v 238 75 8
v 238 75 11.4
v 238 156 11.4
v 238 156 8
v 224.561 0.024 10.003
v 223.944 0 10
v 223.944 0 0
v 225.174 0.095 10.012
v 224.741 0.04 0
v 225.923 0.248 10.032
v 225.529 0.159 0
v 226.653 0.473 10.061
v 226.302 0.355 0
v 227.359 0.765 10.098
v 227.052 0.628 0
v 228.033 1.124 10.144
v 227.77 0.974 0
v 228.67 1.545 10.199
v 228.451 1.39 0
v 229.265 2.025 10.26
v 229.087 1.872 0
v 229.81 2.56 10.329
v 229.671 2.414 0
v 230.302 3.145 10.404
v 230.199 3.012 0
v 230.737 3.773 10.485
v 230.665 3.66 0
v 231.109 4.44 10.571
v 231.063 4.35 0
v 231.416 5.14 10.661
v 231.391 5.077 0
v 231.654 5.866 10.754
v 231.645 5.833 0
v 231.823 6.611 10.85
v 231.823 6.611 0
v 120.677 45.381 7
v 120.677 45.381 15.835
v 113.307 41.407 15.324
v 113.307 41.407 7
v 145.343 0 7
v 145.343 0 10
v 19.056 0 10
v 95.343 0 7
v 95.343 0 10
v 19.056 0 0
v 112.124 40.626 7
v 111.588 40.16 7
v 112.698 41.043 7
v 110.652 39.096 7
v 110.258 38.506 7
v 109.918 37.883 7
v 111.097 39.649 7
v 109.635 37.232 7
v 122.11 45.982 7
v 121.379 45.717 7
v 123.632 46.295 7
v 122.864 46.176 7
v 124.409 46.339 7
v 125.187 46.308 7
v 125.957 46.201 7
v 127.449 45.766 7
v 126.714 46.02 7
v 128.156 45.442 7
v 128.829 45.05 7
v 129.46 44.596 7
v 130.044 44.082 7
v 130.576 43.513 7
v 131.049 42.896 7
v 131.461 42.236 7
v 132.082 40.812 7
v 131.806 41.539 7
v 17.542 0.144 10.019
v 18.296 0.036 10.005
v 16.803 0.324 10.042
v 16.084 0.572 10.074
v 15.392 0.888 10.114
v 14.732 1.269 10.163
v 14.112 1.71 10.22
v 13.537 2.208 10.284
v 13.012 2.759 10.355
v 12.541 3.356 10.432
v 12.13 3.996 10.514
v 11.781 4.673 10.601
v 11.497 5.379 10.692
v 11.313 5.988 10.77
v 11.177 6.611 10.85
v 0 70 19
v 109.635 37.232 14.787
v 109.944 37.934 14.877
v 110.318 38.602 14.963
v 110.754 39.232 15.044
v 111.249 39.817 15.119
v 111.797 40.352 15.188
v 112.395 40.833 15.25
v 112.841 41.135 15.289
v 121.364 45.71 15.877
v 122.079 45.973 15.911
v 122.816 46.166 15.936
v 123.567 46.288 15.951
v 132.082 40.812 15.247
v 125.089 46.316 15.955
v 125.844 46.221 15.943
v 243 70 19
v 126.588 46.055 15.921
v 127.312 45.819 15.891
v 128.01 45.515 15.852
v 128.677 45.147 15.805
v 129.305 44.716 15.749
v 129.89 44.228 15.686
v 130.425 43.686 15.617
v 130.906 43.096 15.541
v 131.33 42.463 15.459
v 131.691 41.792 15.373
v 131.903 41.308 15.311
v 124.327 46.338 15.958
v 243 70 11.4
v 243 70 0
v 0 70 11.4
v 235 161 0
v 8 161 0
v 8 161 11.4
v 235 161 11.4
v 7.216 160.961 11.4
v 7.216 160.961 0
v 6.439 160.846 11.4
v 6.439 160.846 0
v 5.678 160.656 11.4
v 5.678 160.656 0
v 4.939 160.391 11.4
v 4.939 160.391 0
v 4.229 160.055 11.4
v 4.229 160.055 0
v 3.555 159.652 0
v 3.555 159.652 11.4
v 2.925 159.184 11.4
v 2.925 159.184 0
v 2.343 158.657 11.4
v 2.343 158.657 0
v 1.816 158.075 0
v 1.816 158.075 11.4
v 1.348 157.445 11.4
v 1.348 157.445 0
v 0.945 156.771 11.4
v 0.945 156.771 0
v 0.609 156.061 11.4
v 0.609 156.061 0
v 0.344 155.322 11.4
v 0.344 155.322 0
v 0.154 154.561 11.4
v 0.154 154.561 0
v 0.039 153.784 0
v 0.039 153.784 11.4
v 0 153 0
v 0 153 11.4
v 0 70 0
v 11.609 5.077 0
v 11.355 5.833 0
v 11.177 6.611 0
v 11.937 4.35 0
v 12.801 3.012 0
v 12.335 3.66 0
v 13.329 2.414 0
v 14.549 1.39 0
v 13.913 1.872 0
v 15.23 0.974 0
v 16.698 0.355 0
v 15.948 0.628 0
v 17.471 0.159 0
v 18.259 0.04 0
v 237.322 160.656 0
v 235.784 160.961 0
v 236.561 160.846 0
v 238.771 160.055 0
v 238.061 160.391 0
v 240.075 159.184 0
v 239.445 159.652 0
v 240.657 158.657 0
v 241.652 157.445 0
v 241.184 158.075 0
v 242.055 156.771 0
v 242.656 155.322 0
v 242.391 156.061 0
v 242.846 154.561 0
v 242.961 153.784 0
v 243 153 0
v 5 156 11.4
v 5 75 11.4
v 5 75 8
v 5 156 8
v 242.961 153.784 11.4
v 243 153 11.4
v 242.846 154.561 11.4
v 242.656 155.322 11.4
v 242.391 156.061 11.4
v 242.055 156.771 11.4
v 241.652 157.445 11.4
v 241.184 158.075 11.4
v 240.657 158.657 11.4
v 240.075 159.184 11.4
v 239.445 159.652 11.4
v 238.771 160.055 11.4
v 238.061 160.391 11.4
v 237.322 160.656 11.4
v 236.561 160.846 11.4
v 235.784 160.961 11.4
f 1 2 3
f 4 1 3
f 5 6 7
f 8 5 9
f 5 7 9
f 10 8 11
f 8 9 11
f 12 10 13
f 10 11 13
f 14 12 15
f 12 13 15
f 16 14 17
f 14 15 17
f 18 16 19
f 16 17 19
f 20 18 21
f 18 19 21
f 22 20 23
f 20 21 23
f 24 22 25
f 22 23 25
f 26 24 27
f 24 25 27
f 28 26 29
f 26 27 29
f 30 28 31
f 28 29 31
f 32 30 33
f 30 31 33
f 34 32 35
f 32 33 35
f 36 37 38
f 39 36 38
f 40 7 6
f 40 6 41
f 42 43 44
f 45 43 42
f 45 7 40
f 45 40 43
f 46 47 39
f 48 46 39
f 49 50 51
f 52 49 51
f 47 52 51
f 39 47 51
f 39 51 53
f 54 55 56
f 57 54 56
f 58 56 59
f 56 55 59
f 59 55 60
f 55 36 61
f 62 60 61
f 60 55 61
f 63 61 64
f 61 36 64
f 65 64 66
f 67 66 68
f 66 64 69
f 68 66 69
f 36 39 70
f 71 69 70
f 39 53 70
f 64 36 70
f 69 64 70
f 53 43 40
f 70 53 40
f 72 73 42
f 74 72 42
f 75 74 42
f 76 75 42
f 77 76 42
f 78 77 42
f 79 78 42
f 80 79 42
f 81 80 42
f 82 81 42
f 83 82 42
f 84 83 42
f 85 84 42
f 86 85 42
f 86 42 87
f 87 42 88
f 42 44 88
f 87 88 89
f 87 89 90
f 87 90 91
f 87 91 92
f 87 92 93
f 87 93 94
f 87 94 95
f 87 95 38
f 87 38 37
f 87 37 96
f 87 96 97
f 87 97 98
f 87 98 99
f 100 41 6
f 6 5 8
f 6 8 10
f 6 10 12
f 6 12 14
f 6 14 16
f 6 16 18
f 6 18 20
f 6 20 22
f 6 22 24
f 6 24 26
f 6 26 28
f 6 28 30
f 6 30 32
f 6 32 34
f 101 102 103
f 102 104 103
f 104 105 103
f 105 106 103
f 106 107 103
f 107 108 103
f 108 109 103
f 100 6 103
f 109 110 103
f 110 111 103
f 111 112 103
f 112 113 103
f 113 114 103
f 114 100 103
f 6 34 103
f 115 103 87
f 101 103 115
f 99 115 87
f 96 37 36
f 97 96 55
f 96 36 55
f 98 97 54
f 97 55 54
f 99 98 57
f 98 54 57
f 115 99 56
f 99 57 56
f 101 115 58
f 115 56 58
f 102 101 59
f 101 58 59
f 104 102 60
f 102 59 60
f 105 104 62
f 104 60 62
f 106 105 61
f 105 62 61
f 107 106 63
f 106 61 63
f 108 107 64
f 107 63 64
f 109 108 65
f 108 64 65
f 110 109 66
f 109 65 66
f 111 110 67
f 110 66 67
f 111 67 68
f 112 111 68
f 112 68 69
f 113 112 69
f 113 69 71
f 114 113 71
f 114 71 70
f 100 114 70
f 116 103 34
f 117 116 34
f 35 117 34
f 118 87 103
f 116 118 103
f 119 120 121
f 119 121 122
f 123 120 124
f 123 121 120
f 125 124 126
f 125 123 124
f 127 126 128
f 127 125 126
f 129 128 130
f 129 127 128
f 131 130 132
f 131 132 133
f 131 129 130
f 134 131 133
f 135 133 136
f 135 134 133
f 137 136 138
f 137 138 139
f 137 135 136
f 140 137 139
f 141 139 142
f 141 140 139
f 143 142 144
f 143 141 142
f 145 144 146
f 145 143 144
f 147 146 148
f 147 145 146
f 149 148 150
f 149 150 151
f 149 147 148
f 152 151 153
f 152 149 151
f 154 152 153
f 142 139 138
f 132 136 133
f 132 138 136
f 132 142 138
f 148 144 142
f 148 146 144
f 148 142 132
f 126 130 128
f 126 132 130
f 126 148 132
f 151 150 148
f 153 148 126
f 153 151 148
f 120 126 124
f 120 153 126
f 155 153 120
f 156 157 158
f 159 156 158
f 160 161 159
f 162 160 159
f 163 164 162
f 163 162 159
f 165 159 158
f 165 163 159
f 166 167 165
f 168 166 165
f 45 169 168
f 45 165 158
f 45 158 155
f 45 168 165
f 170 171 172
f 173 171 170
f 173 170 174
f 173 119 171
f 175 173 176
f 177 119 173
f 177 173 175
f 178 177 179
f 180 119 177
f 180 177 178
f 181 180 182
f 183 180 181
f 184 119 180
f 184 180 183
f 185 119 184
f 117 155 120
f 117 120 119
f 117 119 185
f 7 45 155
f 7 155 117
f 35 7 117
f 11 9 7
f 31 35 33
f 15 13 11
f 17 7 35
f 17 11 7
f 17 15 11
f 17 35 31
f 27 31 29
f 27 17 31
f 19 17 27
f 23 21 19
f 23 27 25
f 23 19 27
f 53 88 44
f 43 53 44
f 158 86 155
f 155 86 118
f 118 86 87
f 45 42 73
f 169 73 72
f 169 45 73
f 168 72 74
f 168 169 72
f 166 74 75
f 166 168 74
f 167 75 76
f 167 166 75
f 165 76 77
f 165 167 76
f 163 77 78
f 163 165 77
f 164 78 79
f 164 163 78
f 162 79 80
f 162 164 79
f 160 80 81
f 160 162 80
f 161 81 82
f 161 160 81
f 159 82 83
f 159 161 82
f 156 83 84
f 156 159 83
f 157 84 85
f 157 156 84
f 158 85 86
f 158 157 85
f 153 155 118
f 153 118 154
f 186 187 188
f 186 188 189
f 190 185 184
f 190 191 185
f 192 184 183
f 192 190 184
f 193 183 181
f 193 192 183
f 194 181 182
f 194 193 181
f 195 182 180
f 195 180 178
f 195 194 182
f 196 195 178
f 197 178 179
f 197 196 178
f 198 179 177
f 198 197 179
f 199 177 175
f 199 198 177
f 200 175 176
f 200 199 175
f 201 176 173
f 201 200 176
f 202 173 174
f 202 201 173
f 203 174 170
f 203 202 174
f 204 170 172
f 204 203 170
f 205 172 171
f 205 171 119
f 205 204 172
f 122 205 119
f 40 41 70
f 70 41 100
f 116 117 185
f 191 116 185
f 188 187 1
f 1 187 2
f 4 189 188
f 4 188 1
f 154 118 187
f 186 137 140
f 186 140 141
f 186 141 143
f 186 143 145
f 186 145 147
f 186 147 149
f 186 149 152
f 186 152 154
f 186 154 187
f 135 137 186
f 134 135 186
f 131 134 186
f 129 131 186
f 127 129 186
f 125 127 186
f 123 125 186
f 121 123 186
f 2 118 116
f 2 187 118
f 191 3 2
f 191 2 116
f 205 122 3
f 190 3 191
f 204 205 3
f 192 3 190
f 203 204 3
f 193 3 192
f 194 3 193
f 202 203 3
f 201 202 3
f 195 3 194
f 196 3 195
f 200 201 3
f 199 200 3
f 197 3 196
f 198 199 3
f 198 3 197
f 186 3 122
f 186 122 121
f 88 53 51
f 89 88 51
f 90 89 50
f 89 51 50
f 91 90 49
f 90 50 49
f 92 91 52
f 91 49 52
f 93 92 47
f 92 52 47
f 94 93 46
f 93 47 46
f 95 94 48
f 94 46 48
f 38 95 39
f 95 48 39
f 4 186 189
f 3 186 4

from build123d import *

# Parameters (mm, degrees)
F0_W      = 243
F0_H      = 161
F1_DEPTH  = 19
F2_W      = 243
F2_H      = 91
F3_DEPTH  = 7.6
F4_W      = 233
F4_H      = 81
F5_DEPTH  = 3.4
F7_DEPTH  = 19
F9_DEPTH  = 7
F10_R     = 8
F12_DEPTH = 243


with BuildPart() as f1:
    # F0 (on Top) → F1 (new body)
    with BuildSketch(Plane.XY):
        with Locations((121.5, 80.5)):
            Rectangle(F0_W, F0_H)
    extrude(amount=F1_DEPTH)

    # F2 (on face) → F3 (cut)
    with BuildSketch(Plane.XY.offset(19)):
        with Locations((121.5, 115.5)):
            Rectangle(F2_W, F2_H)
    extrude(amount=-F3_DEPTH, mode=Mode.SUBTRACT)

    # F4 (on face) → F5 (cut)
    with BuildSketch(Plane.XY.offset(11.4)):
        with Locations((121.5, 115.5)):
            Rectangle(F4_W, F4_H)
    extrude(amount=-F5_DEPTH, mode=Mode.SUBTRACT)

    # F6 (on face) → F7 (cut, through all)
    with BuildSketch(Plane.XY.offset(19)):
        Polygon((12.3428886496, 0), (0, 70), (0, 0), align=None)
        Polygon((110.697450051, 40), (95.3428886496, 0), (145.3428886496, 0), (129.1186868819, 49.9329586842), align=None)
        Polygon((243, 70), (230.6571113504, 0), (243, 0), align=None)
    extrude(amount=-F7_DEPTH, mode=Mode.SUBTRACT)

    # F8 (on face) → F9 (join)
    with BuildSketch(Plane(origin=(0, 0, 0), x_dir=(1, 0, 0), z_dir=(0, 0, -1))):
        Polygon((145.3428886496, 0), (95.3428886496, 0), (110.697450051, -40), (129.1186868819, -49.9329586842), align=None)
    extrude(amount=-F9_DEPTH)

    # F10
    f10_edges = [f1.edges().sort_by_distance(p)[0] for p in [
        (0, 161, 5.7),
        (243, 161, 5.7),
        (230.657111, 0, 9.5),
        (12.342889, 0, 9.5),
        (110.69745, 40, 13),
        (129.118687, 49.932959, 13),
    ]]
    fillet(f10_edges, radius=F10_R)

    # F11 (on face) → F12 (cut, through all)
    with BuildSketch(Plane.YZ.offset(243)):
        Polygon((0, 19), (0, 10), (70, 19), align=None)
    extrude(amount=-F12_DEPTH, mode=Mode.SUBTRACT)


solid = f1.part
